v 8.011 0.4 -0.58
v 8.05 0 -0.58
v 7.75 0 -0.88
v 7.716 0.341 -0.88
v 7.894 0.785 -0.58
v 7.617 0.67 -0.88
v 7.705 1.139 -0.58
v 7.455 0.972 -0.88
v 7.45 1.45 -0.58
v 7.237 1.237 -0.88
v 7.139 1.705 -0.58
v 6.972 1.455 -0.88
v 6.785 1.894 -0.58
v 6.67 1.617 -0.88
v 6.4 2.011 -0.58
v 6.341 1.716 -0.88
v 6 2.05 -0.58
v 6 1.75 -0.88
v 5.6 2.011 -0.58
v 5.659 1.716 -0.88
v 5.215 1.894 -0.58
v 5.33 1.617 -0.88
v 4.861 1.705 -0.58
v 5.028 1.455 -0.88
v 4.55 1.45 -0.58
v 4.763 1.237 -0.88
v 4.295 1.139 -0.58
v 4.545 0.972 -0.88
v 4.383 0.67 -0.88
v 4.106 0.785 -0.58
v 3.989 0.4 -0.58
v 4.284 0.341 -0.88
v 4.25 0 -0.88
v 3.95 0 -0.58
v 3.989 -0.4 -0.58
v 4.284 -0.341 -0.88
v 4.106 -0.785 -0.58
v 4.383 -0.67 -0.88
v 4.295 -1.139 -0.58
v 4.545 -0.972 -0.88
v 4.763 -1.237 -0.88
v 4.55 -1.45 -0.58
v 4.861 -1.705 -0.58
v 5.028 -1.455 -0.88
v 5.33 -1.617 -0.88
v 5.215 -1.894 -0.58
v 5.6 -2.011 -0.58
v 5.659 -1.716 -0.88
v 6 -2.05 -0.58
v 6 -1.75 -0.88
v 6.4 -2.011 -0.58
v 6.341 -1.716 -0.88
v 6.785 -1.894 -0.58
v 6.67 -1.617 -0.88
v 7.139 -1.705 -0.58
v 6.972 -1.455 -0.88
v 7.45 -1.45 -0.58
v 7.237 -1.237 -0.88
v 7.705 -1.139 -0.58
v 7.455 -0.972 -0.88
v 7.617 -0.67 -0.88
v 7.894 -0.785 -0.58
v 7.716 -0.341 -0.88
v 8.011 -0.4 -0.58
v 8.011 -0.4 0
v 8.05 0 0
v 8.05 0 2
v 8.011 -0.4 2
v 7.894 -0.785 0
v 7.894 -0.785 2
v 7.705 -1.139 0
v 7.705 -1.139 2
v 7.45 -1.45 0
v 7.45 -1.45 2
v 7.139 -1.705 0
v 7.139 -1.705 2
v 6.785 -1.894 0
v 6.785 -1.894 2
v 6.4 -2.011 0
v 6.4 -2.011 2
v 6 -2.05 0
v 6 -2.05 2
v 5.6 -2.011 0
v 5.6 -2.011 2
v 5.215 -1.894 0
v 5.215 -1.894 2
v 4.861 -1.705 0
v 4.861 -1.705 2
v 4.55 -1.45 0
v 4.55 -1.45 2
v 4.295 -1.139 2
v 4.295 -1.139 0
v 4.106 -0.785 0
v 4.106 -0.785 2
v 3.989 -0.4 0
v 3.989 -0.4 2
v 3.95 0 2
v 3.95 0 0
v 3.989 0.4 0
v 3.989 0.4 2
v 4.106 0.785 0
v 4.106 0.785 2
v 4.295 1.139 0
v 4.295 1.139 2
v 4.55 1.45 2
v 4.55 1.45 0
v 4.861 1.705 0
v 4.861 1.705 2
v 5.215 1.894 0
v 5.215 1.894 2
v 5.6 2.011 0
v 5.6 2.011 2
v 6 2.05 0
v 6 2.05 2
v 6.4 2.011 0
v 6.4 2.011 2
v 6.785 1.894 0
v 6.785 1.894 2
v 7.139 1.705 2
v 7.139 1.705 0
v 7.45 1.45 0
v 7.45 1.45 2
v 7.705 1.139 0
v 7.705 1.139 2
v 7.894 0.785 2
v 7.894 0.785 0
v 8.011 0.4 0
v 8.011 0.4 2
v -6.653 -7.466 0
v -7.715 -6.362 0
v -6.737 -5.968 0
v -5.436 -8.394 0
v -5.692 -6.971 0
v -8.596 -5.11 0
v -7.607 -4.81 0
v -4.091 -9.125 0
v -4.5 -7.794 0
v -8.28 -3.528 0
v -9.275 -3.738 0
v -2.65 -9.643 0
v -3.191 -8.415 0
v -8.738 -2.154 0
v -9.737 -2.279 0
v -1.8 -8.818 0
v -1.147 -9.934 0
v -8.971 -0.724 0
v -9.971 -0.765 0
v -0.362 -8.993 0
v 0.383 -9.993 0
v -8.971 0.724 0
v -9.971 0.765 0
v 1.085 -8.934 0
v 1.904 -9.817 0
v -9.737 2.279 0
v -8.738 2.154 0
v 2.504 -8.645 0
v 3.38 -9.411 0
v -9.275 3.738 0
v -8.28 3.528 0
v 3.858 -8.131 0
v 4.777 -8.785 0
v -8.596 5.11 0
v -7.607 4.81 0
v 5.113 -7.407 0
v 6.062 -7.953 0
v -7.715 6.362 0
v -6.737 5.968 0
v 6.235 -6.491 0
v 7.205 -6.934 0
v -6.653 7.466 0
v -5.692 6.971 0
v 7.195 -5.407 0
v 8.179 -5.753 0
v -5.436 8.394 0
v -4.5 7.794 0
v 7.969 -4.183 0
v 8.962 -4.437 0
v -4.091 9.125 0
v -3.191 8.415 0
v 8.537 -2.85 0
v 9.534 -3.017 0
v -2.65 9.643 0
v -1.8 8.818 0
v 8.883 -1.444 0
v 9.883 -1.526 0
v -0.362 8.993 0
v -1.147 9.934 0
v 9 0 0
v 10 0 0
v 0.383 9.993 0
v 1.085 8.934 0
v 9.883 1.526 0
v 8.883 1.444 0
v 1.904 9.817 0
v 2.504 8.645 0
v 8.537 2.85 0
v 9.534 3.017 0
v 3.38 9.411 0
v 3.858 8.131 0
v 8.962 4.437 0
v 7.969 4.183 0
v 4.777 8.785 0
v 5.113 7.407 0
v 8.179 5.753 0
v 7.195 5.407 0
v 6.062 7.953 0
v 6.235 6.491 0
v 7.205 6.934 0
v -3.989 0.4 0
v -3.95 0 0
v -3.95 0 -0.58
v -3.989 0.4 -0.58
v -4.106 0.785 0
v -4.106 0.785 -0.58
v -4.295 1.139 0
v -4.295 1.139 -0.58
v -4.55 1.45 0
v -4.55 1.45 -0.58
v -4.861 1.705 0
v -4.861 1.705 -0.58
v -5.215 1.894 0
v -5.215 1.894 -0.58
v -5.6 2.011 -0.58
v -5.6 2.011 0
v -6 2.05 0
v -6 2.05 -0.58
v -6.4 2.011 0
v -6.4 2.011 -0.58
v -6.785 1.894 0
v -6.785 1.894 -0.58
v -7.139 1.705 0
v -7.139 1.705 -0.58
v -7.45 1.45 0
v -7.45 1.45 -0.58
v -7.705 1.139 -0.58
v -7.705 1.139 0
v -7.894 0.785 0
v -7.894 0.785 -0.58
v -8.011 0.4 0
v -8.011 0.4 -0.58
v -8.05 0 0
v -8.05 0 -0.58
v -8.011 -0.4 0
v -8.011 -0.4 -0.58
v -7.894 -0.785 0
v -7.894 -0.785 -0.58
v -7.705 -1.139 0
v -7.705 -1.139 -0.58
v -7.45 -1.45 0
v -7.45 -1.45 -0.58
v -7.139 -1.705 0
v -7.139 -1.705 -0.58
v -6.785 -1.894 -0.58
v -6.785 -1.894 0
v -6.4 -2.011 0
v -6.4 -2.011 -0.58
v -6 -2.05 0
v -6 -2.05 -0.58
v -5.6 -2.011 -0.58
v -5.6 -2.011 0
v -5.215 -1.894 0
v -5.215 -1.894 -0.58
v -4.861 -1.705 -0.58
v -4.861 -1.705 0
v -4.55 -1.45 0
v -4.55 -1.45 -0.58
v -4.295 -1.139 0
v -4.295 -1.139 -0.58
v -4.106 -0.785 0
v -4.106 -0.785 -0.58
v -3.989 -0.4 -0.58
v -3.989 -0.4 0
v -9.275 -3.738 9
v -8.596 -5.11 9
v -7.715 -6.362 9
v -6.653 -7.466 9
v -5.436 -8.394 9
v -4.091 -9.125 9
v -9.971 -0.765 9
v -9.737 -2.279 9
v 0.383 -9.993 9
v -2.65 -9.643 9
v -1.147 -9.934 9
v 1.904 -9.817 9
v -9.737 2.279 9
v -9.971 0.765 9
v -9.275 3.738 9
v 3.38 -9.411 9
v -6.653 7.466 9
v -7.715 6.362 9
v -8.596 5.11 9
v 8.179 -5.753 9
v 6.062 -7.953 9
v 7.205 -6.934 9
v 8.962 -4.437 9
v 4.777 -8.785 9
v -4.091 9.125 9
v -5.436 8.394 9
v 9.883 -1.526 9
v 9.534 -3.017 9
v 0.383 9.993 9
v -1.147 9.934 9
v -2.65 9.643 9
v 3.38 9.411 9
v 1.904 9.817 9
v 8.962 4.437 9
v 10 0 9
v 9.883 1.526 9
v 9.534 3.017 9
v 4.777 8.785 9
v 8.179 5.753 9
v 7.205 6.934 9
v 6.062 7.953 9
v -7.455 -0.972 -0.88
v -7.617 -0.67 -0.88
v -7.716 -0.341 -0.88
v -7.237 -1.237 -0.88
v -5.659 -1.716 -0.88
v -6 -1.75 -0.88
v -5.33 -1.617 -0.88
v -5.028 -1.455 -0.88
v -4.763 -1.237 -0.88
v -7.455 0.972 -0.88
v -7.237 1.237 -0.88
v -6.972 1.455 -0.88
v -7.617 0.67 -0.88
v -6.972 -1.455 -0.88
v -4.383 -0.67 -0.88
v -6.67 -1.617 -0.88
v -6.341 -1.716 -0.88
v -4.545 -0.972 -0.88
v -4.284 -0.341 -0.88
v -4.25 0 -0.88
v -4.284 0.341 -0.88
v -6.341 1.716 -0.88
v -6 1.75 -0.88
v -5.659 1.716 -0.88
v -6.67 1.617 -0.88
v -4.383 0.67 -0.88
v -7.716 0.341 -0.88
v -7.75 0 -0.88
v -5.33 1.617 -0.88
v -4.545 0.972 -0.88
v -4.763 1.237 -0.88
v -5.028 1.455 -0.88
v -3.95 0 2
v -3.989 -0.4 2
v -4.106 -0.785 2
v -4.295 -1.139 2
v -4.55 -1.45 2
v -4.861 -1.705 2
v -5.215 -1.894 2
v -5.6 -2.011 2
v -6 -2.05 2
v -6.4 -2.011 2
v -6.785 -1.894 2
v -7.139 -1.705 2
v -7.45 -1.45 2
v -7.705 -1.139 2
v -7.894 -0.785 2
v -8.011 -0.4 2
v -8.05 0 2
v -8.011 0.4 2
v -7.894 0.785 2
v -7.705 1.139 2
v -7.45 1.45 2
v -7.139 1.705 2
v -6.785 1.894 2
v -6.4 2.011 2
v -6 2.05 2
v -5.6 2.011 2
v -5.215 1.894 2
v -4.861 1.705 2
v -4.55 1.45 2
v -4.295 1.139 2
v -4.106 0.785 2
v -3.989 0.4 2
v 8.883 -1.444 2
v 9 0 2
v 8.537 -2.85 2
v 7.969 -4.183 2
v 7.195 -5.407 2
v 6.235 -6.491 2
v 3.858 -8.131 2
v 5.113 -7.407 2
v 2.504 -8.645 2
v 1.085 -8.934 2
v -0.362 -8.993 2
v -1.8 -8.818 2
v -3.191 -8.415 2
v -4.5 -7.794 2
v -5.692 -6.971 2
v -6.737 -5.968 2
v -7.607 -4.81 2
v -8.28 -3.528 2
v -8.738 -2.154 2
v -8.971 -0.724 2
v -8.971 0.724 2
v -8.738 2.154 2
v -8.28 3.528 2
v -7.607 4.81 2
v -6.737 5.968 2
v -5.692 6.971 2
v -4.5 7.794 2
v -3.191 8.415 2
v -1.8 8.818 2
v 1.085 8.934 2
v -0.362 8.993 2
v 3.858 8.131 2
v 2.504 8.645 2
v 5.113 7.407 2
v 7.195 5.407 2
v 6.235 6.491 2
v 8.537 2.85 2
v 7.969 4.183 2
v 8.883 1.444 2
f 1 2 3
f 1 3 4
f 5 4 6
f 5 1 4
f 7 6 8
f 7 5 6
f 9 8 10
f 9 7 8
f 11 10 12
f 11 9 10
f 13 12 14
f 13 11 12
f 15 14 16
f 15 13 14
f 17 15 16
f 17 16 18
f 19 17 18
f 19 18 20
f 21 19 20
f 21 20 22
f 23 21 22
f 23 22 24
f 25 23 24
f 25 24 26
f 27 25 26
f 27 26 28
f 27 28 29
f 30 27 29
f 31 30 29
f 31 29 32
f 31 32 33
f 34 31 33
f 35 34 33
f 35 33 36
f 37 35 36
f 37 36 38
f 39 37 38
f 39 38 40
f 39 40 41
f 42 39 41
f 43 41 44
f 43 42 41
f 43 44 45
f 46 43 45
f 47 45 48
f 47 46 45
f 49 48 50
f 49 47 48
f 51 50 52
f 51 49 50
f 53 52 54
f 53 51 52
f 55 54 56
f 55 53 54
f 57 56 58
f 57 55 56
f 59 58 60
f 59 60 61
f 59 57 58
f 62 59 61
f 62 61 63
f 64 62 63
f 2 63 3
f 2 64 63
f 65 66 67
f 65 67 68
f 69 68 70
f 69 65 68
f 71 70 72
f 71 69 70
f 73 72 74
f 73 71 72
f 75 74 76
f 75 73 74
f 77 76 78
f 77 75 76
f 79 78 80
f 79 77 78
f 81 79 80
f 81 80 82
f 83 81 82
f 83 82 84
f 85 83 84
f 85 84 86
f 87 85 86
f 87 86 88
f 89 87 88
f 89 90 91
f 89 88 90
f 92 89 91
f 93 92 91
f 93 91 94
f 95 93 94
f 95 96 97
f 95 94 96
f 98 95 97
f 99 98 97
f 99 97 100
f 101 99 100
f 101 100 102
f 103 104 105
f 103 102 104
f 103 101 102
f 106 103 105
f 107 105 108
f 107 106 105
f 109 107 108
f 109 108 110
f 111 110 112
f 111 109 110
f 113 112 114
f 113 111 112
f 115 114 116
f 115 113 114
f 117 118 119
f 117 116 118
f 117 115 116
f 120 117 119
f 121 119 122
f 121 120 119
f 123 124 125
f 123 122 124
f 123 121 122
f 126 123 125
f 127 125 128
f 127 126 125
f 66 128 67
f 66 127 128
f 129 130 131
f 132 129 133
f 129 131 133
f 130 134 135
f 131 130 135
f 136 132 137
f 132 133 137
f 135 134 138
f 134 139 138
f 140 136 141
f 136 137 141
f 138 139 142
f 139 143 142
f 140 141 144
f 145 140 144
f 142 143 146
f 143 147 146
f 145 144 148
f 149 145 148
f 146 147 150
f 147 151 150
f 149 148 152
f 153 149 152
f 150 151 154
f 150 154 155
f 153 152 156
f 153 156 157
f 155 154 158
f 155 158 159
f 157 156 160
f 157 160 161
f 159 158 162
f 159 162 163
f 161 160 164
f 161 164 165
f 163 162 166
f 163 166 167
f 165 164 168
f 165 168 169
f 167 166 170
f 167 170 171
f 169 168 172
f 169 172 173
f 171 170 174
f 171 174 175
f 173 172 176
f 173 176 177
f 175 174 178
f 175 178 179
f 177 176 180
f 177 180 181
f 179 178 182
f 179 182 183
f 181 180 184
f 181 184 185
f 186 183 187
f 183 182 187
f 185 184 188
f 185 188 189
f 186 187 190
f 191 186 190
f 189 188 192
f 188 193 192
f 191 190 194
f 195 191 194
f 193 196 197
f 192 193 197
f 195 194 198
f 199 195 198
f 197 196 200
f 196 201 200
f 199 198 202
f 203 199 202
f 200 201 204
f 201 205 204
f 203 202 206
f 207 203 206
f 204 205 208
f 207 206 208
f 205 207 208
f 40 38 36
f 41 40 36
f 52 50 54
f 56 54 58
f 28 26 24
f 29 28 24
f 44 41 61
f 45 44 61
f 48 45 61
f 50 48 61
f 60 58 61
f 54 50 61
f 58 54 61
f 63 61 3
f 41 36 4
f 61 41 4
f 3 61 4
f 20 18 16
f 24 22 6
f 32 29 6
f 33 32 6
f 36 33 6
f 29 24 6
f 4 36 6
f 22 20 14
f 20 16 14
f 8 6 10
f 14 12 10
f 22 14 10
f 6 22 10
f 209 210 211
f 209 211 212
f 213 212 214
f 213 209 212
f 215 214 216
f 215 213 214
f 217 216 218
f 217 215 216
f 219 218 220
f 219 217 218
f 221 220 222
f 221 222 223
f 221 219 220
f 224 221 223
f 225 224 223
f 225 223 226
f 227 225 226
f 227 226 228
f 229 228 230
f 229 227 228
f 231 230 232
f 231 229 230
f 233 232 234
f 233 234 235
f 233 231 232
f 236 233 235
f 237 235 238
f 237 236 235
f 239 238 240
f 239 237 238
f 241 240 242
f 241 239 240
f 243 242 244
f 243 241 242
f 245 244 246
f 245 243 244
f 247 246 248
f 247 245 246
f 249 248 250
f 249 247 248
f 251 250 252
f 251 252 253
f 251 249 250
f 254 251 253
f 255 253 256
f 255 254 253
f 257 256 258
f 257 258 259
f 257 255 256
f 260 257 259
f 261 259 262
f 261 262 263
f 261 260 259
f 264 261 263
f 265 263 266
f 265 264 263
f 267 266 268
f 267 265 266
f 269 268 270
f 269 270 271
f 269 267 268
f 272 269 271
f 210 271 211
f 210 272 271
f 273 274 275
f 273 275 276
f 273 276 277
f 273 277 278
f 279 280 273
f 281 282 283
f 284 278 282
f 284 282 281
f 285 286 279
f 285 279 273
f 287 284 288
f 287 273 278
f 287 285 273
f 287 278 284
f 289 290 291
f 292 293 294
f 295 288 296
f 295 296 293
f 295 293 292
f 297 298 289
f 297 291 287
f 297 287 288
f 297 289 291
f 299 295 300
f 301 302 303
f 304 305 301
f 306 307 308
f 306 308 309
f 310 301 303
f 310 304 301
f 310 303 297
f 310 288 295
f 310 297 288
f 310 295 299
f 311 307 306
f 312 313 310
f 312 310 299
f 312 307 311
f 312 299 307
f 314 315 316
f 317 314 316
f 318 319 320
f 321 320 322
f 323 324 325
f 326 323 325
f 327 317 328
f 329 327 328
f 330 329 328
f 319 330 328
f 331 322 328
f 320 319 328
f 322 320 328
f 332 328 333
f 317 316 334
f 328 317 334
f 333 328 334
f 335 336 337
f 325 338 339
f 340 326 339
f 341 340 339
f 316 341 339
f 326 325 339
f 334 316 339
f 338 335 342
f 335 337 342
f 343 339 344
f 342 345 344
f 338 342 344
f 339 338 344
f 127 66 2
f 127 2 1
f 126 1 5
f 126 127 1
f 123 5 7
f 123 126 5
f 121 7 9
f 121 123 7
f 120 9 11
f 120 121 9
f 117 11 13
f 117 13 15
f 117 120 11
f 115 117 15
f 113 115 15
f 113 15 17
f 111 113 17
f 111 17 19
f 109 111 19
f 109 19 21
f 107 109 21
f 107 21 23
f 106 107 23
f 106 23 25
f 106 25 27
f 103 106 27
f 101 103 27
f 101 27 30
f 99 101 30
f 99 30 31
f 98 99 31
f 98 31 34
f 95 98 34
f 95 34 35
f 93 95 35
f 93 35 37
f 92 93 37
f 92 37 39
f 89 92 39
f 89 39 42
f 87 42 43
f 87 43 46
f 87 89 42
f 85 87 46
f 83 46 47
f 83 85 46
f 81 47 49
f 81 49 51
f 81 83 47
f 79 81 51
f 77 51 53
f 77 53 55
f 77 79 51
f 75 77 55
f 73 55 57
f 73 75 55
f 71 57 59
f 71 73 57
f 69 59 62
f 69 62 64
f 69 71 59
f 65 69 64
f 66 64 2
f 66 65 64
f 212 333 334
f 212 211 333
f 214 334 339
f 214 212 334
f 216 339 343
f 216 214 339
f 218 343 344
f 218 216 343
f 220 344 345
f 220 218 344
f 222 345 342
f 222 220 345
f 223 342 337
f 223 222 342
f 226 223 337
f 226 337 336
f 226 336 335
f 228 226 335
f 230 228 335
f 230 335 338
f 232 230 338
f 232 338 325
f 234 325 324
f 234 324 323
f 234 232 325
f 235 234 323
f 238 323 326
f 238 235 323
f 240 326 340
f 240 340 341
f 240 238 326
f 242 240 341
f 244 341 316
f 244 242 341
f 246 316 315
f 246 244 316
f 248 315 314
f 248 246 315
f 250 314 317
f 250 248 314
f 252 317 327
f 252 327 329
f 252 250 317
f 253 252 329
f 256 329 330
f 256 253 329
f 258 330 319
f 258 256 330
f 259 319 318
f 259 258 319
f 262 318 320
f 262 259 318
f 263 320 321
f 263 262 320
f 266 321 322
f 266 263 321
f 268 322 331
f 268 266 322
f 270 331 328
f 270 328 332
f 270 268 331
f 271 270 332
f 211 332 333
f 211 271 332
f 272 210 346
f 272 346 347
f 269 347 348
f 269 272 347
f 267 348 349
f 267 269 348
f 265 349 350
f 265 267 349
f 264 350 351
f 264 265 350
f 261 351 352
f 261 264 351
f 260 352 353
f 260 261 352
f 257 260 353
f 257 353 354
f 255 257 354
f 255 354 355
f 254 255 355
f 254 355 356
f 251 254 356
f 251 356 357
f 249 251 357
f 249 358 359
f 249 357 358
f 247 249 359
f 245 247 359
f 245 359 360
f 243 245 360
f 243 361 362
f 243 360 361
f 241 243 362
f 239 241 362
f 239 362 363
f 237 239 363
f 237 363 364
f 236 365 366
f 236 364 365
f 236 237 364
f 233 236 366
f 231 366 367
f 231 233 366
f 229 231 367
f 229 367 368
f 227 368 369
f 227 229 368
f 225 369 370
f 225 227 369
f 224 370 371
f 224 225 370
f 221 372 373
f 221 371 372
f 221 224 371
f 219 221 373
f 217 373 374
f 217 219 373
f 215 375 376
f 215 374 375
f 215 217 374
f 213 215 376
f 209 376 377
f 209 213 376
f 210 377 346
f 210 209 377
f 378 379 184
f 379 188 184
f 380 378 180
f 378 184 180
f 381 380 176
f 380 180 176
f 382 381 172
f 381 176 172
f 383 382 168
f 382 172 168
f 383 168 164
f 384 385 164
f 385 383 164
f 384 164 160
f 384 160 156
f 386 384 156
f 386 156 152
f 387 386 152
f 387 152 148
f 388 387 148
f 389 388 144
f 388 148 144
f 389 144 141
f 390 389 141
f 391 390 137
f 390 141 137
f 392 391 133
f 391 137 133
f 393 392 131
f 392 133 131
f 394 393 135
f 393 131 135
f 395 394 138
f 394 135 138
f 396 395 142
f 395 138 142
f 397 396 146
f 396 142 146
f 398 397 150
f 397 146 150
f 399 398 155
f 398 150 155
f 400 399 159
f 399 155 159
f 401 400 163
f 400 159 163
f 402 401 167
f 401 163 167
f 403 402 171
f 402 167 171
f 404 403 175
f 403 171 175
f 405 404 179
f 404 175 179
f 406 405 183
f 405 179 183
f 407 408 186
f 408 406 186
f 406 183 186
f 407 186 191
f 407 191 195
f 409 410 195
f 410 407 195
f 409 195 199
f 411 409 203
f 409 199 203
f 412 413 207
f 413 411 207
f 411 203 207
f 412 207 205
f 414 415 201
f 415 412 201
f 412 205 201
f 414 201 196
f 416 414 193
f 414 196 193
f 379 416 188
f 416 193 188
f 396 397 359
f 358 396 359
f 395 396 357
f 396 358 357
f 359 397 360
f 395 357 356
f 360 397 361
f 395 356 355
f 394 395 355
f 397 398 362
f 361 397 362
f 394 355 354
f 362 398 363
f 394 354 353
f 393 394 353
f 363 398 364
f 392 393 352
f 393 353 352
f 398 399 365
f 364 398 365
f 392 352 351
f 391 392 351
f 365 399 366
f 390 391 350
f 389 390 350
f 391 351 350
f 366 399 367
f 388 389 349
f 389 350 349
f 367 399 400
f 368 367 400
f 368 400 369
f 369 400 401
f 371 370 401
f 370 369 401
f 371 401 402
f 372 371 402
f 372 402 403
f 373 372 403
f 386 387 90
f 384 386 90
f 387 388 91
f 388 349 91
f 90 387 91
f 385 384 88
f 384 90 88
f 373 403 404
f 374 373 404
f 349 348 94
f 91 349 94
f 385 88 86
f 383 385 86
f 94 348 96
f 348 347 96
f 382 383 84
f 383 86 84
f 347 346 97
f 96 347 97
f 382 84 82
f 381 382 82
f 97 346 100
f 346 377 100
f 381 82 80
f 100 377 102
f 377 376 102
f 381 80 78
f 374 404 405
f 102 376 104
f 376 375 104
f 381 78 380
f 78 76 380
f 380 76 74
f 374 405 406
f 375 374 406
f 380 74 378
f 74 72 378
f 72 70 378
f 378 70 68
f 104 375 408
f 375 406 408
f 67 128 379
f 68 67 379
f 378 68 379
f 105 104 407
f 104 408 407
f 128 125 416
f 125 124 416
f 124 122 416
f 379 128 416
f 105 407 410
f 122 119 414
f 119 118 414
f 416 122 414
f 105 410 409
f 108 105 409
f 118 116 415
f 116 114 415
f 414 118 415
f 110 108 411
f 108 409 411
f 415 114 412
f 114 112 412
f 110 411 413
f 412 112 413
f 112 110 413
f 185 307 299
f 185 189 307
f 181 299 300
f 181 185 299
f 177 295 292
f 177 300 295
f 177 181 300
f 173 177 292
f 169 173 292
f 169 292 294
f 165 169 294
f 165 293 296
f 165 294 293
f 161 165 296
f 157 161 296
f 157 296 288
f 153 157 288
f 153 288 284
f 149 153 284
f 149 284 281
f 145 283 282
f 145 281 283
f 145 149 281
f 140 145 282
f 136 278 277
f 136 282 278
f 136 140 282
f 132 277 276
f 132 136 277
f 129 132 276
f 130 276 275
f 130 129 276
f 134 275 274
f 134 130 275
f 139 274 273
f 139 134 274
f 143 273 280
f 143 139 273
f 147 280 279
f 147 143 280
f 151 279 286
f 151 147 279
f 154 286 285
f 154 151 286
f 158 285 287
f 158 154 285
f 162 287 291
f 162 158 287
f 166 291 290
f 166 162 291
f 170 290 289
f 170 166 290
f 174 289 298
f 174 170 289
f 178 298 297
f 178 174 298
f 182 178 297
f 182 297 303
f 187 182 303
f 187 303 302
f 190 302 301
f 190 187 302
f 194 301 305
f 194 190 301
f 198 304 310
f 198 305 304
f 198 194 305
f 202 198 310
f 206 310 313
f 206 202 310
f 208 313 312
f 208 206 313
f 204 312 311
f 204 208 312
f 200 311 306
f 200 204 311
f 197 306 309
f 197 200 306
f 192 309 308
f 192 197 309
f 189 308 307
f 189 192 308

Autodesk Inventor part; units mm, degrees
ref_plane "YZ Plane" through (0, 0, 0) normal (1, 0, 0) x (0, 1, 0)
ref_plane "XZ Plane" through (0, 0, 0) normal (0, 1, 0) x (-1, 0, 0)
ref_plane "XY Plane" through (0, 0, 0) normal (0, 0, 1) x (1, 0, 0)
sketch "スケッチ1" plane through (0, 0, 0) normal (0, 0, 1) x (1, 0, 0)
  circle A0 centre (0, 0) radius 10
  circle A1 centre (0, 0) radius 9
  line L0 (-14, 0) -> (14, 0) construction
  line L1 (0, -14) -> (0, 14) construction
  circle A2 centre (-6, 0) radius 2.05
  circle A3 centre (6, 0) radius 2.05
  dimension "d0" = 20
  dimension "d1" = 18
  dimension "d2" = 4.1
  dimension "d3" = 6
extrude "押し出し1" add sketch "スケッチ1" along normal blind 9 contours A0 | A1 | A2 | A3
extrude "押し出し2" cut sketch "スケッチ1" along normal blind 2 contours A1
extrude "押し出し4" add sketch "スケッチ1" against normal blind 0.88 contours A2 | A3
chamfer "面取り1" distance 0.3 angle 45 2 edges at (-8.05, 0, -0.88) (3.95, 0, -0.88)
properties part number "wheel"
